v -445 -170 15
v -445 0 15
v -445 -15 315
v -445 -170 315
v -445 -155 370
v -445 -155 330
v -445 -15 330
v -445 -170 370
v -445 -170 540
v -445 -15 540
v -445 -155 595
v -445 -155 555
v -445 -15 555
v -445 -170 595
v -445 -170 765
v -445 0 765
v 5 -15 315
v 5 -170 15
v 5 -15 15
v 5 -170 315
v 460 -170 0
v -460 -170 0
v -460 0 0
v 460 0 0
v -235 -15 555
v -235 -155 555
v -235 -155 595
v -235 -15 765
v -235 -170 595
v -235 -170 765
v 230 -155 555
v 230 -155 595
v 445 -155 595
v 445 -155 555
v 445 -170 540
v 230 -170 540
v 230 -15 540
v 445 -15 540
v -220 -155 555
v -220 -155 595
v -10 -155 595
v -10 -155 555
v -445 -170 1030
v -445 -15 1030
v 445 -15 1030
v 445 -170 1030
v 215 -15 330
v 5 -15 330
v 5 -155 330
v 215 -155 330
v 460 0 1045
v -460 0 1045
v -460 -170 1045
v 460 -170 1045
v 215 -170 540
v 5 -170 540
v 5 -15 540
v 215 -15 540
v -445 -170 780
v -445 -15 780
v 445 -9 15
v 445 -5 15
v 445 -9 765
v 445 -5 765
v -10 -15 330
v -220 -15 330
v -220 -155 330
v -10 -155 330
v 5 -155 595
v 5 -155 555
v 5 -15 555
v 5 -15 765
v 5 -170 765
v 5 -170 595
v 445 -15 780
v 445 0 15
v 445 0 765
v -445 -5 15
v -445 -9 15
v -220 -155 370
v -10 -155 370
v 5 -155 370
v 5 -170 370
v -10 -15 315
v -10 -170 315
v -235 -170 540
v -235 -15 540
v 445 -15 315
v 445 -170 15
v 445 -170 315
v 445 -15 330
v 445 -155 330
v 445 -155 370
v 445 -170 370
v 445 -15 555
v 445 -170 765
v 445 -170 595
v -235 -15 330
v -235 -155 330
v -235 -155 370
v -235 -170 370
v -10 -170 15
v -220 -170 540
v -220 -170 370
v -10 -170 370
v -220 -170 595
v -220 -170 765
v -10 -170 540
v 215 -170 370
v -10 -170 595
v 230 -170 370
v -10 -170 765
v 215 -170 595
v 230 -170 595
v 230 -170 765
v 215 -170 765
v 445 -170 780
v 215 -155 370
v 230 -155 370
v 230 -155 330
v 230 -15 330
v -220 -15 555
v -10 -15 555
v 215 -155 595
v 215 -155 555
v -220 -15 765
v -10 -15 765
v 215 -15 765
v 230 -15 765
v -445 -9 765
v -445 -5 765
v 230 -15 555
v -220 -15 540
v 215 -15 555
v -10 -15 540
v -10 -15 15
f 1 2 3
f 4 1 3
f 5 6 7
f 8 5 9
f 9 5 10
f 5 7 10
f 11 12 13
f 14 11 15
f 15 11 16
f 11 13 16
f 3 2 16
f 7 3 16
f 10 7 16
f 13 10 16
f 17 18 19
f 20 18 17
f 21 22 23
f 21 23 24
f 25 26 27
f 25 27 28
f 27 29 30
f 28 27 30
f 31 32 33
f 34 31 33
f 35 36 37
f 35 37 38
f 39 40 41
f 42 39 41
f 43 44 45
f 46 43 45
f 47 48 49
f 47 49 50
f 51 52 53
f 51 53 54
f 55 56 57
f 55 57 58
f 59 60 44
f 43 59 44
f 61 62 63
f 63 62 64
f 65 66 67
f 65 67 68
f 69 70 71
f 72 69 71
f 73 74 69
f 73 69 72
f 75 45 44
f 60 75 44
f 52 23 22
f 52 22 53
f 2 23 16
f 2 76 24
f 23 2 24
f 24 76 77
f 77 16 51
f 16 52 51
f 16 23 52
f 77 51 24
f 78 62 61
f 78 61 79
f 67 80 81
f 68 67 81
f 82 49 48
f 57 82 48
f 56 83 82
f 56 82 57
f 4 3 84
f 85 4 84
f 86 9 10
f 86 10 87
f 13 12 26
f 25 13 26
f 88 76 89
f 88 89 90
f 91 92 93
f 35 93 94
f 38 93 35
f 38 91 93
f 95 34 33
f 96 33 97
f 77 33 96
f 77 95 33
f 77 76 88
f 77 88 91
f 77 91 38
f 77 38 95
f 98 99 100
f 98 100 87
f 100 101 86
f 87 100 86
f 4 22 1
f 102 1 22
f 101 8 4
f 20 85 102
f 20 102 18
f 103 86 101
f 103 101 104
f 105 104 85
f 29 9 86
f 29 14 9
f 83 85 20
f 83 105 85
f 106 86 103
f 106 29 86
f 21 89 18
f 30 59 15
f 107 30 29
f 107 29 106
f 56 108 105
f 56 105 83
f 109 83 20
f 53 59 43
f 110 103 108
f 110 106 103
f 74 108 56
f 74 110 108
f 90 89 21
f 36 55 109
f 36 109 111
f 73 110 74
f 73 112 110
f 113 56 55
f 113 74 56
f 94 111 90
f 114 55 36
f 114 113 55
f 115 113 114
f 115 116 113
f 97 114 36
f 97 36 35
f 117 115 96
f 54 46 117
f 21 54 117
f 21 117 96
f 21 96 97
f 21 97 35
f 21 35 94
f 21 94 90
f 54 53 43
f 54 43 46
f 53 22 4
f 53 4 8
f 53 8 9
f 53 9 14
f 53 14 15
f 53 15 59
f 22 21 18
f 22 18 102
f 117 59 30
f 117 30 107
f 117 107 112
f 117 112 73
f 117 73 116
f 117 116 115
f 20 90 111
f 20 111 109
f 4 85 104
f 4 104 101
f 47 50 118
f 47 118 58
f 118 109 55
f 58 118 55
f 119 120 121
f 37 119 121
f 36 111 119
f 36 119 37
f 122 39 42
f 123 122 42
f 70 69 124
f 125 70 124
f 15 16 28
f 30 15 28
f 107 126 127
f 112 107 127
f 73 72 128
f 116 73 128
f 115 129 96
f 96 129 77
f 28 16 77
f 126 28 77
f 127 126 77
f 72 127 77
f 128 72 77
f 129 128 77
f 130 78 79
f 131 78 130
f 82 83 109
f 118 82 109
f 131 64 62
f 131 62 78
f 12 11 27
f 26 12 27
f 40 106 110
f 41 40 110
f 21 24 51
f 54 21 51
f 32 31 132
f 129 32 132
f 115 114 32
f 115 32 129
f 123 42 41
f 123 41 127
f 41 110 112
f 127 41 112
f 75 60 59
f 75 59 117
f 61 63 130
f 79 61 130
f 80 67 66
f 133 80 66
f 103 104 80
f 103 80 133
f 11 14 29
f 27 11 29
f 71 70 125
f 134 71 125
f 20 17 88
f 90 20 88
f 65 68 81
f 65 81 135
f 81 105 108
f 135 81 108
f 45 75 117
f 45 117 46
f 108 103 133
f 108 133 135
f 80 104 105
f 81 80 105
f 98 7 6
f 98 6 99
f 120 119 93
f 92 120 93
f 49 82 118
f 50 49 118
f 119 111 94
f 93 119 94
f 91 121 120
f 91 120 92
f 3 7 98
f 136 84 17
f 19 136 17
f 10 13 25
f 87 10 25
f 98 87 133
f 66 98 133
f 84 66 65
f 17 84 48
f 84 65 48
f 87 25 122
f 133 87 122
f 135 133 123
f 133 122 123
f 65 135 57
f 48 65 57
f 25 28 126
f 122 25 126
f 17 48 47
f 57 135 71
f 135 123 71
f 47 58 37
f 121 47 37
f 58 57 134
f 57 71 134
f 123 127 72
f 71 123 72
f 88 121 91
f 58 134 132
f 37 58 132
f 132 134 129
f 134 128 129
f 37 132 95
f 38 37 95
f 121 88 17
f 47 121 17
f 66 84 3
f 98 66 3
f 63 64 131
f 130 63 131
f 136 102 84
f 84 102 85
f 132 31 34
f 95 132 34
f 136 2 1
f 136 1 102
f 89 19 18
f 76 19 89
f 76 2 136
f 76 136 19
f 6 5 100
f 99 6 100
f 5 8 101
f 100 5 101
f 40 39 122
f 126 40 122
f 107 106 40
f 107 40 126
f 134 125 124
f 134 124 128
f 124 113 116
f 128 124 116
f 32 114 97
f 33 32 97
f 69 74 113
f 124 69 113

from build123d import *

# Parameters (mm, degrees)
F0_W      = 920
F0_H      = 1045
F1_DEPTH  = 170
F2_T      = -15
F3_W      = 920
F3_H      = 280
F4_DEPTH  = 15
F5_W      = 890
F5_H      = 750
F6_DEPTH  = 4
F7_W      = 890
F7_H      = 15
F8_DEPTH  = 155
F9_W      = 890
F9_H      = 15
F10_DEPTH = 155
F11_W     = 15
F11_H     = 435
F12_DEPTH = 155
F13_W     = 890
F13_H     = 40
F14_DEPTH = 15
F15_W     = 15
F15_H     = 370
F16_DEPTH = 155


with BuildPart() as f1:
    # F0 (on Front) → F1 (new body)
    with BuildSketch(Plane.XZ):
        with Locations((0, 522.5)):
            Rectangle(F0_W, F0_H)
    extrude(amount=F1_DEPTH)

    # F2
    f2_openings = [f1.faces().sort_by_distance(p)[0] for p in [
        (0, -170, 522.5),
        (0, 0, 522.5),
    ]]
    offset(amount=F2_T, openings=f2_openings)

    # F3 (on face) → F4 (join)
    with BuildSketch(Plane(origin=(0, 0, 0), x_dir=(-1, 0, 0), z_dir=(0, 1, 0))):
        with Locations((0, 905)):
            Rectangle(F3_W, F3_H)
    extrude(amount=-F4_DEPTH)

    # F7 (on face) → F8 (join, through all)
    with BuildSketch(Plane.XZ.offset(15)):
        with Locations((0, 772.5)):
            Rectangle(F7_W, F7_H)
        with Locations((0, 322.5)):
            Rectangle(F7_W, F7_H)
    extrude(amount=F8_DEPTH)

    # F9 (on face) → F10 (join, through all)
    with BuildSketch(Plane.XZ.offset(170)):
        with Locations((0, 547.5)):
            Rectangle(F9_W, F9_H)
    extrude(amount=-F10_DEPTH)

    # F11 (on face) → F12 (join, through all)
    with BuildSketch(Plane.XZ.offset(170)):
        with Locations((-227.5, 547.5)):
            Rectangle(F11_W, F11_H)
        with Locations((-2.5, 547.5)):
            Rectangle(F11_W, F11_H)
        with Locations((222.5, 547.5)):
            Rectangle(F11_W, F11_H)
    extrude(amount=-F12_DEPTH)

    # F13 (on face) → F14 (join)
    with BuildSketch(Plane.XZ.offset(170)):
        with Locations((0, 350)):
            Rectangle(F13_W, F13_H)
        with Locations((0, 575)):
            Rectangle(F13_W, F13_H)
    extrude(amount=-F14_DEPTH)

    # F15 (on face) → F16 (join, through all)
    with BuildSketch(Plane.XZ.offset(170)):
        with Locations((-2.5, 185)):
            Rectangle(F15_W, F15_H)
    extrude(amount=-F16_DEPTH)


with BuildPart() as f6:
    # F5 (on face) → F6 (new body)
    with BuildSketch(Plane(origin=(0, 0, 0), x_dir=(-1, 0, 0), z_dir=(0, 1, 0))):
        with Locations((0, 390)):
            Rectangle(F5_W, F5_H)
    extrude(amount=-F6_DEPTH)


with BuildPart() as f6_1:
    # F17: moved
    add(f6.part.moved(Location((0, -5, 0))))


solid = Compound([f1.part, f6_1.part])
